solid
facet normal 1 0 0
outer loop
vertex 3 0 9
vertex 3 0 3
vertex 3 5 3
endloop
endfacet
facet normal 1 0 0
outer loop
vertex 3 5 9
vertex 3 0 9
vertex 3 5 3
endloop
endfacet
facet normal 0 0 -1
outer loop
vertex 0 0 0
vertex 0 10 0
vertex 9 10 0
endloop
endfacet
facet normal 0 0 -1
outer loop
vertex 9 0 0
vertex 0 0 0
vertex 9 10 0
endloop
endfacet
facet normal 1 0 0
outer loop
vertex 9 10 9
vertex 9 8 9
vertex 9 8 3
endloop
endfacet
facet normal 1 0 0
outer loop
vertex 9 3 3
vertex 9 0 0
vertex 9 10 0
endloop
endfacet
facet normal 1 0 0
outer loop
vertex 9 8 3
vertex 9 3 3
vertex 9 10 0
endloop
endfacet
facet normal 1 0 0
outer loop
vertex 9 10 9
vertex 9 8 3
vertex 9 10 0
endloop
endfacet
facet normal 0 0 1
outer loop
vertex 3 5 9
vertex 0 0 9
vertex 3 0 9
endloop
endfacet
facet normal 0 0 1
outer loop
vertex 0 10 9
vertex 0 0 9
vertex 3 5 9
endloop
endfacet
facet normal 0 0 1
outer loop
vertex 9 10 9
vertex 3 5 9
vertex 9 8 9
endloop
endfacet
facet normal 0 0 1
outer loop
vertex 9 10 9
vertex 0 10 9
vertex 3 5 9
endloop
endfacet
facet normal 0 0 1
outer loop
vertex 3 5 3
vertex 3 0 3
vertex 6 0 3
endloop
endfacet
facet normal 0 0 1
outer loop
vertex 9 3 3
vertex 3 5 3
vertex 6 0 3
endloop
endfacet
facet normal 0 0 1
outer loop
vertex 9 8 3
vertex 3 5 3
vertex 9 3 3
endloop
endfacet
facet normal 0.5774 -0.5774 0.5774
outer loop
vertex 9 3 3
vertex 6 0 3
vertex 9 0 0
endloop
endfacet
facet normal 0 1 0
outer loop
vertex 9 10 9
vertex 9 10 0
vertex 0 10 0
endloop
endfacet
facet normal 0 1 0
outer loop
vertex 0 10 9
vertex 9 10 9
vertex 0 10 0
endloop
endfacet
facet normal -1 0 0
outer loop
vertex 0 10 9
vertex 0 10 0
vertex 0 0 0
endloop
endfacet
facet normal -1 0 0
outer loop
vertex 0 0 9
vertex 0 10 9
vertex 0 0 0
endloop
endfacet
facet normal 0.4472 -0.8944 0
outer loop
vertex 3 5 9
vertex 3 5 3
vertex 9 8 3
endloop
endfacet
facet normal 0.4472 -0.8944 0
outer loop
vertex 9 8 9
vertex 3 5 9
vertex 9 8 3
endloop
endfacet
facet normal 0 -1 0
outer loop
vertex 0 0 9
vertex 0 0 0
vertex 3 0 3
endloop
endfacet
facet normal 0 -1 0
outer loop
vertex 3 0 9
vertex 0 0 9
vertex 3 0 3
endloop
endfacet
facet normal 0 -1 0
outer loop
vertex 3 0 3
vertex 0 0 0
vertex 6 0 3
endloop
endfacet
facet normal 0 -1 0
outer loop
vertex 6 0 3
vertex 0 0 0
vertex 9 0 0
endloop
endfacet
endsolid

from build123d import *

# Parameters (mm, degrees)
F1_DEPTH = 3
F2_DEPTH = 9
F7_DEPTH = 5.1971524227


with BuildPart() as f1:
    # F0 (on Top) → F1 (new body)
    with BuildSketch(Plane.XY):
        Polygon((0, 10), (0, 0), (3, 0), (3, 5), (9, 8), (9, 10), align=None)
        Polygon((3, 5), (3, 0), (9, 0), (9, 8), align=None)
    extrude(amount=F1_DEPTH)

    # F0 (on Top) → F2 (join)
    with BuildSketch(Plane.XY):
        Polygon((0, 10), (0, 0), (3, 0), (3, 5), (9, 8), (9, 10), align=None)
    extrude(amount=F2_DEPTH)

    # F6 (on 3pt) → F7 (cut, through all)
    with BuildSketch(Plane(origin=(3, -3, 3), x_dir=(0.4082482905, 0.8164965809, 0.4082482905), z_dir=(0.5773502692, -0.5773502692, 0.5773502692))):
        Polygon((7.3484692283, -4.2426406871), (3.6742346142, -2.1213203436), (3.6742346142, -6.3639610307), align=None)
    extrude(amount=F7_DEPTH, mode=Mode.SUBTRACT)


solid = f1.part
